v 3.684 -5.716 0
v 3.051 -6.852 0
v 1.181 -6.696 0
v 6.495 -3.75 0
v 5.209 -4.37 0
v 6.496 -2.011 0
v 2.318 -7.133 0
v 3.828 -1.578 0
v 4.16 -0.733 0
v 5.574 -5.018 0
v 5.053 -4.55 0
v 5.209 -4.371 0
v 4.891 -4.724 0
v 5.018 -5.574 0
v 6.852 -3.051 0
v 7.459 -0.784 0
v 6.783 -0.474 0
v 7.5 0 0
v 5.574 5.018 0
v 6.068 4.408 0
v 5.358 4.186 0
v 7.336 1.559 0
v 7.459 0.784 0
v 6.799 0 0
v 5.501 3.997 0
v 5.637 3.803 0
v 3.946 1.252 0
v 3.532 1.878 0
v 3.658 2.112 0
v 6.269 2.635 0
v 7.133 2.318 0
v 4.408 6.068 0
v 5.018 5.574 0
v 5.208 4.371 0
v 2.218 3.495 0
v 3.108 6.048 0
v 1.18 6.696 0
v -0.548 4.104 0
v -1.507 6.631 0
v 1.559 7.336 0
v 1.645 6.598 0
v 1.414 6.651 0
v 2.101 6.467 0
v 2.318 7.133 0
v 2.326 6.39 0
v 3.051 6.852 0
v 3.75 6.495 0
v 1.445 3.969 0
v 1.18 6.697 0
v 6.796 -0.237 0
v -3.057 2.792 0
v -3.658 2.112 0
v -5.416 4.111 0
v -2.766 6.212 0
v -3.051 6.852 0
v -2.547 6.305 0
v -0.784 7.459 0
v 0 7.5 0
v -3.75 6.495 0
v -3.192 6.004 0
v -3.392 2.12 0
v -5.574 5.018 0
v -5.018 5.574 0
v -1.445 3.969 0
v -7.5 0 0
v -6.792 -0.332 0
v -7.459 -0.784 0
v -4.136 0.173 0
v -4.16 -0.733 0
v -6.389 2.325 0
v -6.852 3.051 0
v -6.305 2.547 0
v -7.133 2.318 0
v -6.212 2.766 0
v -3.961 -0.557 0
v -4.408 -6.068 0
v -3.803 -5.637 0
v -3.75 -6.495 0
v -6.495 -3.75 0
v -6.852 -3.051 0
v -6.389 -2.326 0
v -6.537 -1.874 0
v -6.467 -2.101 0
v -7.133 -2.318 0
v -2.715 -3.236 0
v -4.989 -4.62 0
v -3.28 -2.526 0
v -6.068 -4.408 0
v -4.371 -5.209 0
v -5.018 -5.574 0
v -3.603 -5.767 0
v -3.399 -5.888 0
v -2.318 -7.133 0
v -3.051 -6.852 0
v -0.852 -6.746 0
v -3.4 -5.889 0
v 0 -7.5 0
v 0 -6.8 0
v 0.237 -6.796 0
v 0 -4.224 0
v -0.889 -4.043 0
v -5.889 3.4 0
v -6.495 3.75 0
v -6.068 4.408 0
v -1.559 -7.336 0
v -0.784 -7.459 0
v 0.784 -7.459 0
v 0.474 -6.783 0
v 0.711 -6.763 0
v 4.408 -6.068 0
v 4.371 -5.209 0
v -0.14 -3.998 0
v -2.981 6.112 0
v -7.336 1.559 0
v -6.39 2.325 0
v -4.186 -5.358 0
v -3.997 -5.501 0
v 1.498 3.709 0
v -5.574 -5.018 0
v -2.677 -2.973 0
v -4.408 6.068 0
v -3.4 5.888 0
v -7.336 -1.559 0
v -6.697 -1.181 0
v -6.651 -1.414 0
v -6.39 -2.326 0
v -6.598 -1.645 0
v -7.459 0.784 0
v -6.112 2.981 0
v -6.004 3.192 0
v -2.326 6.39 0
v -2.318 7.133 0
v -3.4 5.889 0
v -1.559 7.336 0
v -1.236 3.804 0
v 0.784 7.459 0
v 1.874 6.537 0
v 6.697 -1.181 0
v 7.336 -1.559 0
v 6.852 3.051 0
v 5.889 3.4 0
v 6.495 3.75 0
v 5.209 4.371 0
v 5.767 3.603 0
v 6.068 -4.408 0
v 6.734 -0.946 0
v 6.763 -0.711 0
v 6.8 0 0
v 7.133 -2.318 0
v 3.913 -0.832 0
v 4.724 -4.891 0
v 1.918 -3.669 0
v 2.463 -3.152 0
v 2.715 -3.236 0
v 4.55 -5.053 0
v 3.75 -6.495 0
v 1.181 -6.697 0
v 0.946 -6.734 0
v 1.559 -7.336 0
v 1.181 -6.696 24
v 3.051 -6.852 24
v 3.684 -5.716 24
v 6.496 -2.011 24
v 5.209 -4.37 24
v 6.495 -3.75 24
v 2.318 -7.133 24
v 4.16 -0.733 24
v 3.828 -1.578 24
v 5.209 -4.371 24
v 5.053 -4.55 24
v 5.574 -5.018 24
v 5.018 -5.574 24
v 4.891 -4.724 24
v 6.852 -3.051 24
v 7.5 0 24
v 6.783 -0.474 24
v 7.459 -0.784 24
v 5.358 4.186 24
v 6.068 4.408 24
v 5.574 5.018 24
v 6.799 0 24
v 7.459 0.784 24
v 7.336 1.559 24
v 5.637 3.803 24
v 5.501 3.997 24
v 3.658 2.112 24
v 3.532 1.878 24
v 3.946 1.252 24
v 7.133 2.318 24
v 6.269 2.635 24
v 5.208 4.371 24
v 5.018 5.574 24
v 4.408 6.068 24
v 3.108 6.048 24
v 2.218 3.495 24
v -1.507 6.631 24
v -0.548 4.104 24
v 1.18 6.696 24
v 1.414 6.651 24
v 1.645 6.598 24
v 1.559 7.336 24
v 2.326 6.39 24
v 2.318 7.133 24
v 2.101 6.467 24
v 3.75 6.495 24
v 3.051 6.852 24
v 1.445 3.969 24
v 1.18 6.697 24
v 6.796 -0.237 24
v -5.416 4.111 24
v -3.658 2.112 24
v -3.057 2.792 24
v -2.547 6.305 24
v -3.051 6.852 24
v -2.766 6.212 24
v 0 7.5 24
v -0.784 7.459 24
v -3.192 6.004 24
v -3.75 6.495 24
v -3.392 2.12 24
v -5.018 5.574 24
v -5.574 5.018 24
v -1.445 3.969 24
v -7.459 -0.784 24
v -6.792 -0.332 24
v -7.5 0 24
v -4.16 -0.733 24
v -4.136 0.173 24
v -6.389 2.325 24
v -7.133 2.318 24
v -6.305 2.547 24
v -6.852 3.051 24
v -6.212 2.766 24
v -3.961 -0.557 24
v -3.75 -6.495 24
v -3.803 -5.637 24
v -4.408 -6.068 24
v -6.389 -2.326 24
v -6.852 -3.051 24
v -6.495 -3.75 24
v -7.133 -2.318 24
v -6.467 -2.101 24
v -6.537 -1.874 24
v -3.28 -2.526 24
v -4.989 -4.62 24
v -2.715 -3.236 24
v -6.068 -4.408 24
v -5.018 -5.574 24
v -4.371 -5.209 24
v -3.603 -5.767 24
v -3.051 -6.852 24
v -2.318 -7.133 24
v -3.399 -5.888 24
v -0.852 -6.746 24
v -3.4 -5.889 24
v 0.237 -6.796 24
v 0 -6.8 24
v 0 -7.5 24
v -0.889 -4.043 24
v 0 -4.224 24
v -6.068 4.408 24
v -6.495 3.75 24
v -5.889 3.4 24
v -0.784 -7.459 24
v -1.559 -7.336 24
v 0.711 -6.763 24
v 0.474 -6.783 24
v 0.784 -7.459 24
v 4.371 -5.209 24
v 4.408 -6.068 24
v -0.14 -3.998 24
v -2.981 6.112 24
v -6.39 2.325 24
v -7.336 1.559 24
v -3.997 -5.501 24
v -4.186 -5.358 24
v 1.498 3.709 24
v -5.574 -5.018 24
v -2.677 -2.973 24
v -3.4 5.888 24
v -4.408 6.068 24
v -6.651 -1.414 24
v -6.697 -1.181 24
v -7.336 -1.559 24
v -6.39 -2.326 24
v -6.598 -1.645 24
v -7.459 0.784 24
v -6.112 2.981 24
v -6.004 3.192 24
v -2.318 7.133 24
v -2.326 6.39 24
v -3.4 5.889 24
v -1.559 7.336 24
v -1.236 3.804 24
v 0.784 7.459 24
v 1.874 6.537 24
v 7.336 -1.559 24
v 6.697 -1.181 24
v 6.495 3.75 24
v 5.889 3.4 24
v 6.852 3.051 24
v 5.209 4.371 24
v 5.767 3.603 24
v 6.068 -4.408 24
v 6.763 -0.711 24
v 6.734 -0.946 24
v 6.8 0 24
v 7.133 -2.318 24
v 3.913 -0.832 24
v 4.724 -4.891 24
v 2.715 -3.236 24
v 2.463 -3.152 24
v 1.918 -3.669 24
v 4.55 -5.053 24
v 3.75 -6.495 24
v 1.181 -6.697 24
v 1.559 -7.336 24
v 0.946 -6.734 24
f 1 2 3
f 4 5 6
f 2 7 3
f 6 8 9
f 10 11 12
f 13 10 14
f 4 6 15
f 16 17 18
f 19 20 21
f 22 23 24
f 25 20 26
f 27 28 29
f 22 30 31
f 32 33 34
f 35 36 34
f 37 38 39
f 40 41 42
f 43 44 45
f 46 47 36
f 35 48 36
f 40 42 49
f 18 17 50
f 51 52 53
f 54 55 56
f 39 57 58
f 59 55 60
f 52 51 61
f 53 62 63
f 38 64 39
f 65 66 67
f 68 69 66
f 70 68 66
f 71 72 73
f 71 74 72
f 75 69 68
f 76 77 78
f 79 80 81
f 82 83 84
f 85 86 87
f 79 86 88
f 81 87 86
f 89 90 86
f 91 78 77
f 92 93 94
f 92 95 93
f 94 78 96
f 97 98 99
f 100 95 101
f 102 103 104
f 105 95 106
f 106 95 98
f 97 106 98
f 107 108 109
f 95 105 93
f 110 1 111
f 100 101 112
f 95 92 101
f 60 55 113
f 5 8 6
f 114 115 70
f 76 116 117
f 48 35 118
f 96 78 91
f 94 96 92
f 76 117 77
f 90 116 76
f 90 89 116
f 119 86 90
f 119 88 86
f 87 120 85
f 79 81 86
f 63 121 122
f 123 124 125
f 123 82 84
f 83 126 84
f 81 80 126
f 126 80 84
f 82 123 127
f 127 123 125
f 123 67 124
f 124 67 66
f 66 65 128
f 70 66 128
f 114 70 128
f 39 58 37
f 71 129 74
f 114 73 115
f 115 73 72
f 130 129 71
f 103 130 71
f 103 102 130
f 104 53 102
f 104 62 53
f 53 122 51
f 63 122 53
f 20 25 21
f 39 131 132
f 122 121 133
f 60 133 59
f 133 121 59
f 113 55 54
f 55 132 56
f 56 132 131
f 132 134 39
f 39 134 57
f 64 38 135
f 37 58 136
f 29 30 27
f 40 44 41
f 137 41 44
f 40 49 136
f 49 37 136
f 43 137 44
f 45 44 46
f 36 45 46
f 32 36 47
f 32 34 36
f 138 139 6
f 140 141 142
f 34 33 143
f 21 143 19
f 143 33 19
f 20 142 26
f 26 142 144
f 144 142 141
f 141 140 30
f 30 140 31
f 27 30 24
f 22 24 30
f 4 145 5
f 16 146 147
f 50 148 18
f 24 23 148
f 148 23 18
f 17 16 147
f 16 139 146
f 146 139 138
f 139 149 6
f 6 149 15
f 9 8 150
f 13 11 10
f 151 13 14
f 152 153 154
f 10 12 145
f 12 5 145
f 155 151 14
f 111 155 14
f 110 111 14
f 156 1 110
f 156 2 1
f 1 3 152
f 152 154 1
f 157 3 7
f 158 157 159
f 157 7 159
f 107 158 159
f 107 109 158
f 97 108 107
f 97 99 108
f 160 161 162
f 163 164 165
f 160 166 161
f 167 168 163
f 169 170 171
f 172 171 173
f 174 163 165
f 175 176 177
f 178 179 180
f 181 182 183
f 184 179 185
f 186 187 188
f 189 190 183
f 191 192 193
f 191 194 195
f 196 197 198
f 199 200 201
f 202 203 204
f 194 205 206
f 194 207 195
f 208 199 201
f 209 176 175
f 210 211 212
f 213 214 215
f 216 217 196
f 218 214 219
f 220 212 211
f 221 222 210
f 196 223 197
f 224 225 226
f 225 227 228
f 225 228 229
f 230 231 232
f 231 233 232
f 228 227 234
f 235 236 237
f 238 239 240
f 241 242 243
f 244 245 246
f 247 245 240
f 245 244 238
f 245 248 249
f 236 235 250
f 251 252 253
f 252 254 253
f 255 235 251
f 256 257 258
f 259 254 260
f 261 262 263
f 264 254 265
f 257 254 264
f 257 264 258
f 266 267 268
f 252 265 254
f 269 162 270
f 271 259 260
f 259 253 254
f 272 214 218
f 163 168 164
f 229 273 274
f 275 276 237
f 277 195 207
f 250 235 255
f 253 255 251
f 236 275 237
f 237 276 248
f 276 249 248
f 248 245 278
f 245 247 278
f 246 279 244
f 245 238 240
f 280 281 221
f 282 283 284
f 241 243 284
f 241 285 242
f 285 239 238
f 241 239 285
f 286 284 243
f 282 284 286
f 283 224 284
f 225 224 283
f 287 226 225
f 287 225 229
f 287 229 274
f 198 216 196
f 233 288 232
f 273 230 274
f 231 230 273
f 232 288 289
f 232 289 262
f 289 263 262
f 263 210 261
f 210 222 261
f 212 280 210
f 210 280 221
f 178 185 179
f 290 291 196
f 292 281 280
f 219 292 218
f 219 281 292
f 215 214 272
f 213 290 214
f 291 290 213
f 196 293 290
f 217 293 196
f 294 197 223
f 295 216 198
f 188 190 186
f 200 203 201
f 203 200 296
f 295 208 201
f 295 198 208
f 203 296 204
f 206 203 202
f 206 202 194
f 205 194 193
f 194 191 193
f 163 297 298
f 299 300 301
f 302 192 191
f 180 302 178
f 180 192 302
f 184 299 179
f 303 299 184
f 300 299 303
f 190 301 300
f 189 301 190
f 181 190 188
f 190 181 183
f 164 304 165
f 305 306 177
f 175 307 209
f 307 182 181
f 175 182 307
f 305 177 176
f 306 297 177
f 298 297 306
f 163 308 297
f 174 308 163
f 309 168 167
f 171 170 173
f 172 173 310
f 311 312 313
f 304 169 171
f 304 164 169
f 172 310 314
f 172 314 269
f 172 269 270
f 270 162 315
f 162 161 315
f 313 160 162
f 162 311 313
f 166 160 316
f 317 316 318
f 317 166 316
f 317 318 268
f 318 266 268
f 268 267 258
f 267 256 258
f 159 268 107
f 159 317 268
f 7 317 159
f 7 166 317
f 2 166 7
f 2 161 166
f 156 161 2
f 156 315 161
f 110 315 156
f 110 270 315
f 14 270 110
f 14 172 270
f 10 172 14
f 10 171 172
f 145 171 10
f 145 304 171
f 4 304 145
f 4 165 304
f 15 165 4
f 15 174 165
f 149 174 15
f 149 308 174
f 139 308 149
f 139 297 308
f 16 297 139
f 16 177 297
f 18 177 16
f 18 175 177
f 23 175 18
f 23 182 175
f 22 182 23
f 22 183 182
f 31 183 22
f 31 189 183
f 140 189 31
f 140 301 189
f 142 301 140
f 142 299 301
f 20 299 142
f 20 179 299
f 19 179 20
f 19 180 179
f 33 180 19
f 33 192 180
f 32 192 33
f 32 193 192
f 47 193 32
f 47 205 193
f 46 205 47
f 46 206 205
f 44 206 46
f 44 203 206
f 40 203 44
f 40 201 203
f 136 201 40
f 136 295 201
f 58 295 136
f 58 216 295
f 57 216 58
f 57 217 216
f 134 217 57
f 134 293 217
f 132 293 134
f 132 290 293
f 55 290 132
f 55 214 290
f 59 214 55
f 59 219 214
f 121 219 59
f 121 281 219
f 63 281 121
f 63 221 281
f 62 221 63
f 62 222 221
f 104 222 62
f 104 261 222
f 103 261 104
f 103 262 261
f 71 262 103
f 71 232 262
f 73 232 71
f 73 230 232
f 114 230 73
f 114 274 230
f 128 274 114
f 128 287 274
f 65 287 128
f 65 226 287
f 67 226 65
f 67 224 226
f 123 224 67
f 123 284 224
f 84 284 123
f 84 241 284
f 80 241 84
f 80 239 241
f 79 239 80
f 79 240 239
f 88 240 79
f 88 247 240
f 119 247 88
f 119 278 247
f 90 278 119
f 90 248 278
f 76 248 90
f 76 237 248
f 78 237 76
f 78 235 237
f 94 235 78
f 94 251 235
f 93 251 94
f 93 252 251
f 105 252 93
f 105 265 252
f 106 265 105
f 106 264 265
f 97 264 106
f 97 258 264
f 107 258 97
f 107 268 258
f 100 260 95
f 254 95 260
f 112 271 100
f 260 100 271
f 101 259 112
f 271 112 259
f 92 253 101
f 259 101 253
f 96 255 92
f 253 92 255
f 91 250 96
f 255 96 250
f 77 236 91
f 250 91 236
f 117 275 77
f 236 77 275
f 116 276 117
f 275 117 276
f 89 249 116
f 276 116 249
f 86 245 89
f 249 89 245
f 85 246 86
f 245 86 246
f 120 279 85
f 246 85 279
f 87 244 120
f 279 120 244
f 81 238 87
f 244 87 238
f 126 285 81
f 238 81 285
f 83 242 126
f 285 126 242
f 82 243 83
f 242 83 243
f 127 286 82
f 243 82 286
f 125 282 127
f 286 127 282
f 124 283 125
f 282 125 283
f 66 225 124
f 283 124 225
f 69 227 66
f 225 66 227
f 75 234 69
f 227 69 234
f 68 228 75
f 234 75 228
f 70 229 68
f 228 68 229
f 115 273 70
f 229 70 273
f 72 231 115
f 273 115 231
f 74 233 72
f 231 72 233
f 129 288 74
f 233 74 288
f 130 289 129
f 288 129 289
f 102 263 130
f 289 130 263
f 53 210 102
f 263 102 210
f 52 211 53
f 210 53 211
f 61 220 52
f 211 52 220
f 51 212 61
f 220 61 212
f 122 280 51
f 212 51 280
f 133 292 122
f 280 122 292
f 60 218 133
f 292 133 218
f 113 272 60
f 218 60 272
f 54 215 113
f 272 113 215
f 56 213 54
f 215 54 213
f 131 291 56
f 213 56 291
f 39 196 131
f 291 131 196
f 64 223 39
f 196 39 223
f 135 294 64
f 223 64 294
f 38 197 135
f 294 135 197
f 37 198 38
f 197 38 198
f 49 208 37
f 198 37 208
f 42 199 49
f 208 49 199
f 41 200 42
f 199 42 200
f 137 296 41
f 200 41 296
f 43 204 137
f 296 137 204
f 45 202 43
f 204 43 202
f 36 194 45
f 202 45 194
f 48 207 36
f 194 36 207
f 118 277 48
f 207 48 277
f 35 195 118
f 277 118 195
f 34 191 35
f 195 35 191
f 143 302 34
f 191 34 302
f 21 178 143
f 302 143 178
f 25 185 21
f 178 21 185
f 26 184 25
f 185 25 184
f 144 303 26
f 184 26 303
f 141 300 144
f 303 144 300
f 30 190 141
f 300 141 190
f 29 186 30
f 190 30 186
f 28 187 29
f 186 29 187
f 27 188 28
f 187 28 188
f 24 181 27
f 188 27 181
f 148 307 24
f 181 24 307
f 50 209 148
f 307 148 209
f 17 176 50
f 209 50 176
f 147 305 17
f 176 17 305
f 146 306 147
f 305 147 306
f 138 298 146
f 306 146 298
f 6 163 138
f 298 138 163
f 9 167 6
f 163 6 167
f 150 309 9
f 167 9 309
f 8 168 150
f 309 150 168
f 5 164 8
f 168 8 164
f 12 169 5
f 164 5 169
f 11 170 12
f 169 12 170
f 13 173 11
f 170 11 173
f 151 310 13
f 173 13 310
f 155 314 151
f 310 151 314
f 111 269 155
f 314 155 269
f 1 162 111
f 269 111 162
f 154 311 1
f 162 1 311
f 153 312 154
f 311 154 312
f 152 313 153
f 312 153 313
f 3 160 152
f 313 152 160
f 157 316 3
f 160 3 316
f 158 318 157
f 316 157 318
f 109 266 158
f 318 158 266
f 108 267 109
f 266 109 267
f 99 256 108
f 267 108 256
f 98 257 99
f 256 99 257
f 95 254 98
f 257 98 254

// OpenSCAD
// @author Siarhei Kuzmin, 2014
// Parametric linear bearing. With height=24, od=15, id=8 this is lm8uu
calc_threshold=0.0001;


module bearing1(height, id, od, od_thickness=0, claw_count=9) {
	od_thickness_p = od_thickness != 0 ? od_thickness : od*0.1;
	sector=360/claw_count;
	// polar coordinates
	function p(d, deg) = [cos(deg*sector)*(id+(od-id-od_thickness_p)*d)/2, sin(deg*sector)*(id+(od-id-od_thickness_p)*d)/2];
	linear_extrude(height=height)
	difference() {
		circle(d=od, $fn=60);
		for (s=[0:sector:360])
			rotate([0, 0, s])
			polygon(points=[p(1, 0), p(0.05, 0.44), p(0, 0.7), p(0.08, 0.75), p(1, 0.57),
				p(1, 0.75), p(1, 0.8), p(1, 0.85), p(1, 0.9), p(1, 0.95), p(1,1 + calc_threshold), [0,0]]);
	}
}

bearing1(height=24, od=15, id=8, od_thickness=1.4);
